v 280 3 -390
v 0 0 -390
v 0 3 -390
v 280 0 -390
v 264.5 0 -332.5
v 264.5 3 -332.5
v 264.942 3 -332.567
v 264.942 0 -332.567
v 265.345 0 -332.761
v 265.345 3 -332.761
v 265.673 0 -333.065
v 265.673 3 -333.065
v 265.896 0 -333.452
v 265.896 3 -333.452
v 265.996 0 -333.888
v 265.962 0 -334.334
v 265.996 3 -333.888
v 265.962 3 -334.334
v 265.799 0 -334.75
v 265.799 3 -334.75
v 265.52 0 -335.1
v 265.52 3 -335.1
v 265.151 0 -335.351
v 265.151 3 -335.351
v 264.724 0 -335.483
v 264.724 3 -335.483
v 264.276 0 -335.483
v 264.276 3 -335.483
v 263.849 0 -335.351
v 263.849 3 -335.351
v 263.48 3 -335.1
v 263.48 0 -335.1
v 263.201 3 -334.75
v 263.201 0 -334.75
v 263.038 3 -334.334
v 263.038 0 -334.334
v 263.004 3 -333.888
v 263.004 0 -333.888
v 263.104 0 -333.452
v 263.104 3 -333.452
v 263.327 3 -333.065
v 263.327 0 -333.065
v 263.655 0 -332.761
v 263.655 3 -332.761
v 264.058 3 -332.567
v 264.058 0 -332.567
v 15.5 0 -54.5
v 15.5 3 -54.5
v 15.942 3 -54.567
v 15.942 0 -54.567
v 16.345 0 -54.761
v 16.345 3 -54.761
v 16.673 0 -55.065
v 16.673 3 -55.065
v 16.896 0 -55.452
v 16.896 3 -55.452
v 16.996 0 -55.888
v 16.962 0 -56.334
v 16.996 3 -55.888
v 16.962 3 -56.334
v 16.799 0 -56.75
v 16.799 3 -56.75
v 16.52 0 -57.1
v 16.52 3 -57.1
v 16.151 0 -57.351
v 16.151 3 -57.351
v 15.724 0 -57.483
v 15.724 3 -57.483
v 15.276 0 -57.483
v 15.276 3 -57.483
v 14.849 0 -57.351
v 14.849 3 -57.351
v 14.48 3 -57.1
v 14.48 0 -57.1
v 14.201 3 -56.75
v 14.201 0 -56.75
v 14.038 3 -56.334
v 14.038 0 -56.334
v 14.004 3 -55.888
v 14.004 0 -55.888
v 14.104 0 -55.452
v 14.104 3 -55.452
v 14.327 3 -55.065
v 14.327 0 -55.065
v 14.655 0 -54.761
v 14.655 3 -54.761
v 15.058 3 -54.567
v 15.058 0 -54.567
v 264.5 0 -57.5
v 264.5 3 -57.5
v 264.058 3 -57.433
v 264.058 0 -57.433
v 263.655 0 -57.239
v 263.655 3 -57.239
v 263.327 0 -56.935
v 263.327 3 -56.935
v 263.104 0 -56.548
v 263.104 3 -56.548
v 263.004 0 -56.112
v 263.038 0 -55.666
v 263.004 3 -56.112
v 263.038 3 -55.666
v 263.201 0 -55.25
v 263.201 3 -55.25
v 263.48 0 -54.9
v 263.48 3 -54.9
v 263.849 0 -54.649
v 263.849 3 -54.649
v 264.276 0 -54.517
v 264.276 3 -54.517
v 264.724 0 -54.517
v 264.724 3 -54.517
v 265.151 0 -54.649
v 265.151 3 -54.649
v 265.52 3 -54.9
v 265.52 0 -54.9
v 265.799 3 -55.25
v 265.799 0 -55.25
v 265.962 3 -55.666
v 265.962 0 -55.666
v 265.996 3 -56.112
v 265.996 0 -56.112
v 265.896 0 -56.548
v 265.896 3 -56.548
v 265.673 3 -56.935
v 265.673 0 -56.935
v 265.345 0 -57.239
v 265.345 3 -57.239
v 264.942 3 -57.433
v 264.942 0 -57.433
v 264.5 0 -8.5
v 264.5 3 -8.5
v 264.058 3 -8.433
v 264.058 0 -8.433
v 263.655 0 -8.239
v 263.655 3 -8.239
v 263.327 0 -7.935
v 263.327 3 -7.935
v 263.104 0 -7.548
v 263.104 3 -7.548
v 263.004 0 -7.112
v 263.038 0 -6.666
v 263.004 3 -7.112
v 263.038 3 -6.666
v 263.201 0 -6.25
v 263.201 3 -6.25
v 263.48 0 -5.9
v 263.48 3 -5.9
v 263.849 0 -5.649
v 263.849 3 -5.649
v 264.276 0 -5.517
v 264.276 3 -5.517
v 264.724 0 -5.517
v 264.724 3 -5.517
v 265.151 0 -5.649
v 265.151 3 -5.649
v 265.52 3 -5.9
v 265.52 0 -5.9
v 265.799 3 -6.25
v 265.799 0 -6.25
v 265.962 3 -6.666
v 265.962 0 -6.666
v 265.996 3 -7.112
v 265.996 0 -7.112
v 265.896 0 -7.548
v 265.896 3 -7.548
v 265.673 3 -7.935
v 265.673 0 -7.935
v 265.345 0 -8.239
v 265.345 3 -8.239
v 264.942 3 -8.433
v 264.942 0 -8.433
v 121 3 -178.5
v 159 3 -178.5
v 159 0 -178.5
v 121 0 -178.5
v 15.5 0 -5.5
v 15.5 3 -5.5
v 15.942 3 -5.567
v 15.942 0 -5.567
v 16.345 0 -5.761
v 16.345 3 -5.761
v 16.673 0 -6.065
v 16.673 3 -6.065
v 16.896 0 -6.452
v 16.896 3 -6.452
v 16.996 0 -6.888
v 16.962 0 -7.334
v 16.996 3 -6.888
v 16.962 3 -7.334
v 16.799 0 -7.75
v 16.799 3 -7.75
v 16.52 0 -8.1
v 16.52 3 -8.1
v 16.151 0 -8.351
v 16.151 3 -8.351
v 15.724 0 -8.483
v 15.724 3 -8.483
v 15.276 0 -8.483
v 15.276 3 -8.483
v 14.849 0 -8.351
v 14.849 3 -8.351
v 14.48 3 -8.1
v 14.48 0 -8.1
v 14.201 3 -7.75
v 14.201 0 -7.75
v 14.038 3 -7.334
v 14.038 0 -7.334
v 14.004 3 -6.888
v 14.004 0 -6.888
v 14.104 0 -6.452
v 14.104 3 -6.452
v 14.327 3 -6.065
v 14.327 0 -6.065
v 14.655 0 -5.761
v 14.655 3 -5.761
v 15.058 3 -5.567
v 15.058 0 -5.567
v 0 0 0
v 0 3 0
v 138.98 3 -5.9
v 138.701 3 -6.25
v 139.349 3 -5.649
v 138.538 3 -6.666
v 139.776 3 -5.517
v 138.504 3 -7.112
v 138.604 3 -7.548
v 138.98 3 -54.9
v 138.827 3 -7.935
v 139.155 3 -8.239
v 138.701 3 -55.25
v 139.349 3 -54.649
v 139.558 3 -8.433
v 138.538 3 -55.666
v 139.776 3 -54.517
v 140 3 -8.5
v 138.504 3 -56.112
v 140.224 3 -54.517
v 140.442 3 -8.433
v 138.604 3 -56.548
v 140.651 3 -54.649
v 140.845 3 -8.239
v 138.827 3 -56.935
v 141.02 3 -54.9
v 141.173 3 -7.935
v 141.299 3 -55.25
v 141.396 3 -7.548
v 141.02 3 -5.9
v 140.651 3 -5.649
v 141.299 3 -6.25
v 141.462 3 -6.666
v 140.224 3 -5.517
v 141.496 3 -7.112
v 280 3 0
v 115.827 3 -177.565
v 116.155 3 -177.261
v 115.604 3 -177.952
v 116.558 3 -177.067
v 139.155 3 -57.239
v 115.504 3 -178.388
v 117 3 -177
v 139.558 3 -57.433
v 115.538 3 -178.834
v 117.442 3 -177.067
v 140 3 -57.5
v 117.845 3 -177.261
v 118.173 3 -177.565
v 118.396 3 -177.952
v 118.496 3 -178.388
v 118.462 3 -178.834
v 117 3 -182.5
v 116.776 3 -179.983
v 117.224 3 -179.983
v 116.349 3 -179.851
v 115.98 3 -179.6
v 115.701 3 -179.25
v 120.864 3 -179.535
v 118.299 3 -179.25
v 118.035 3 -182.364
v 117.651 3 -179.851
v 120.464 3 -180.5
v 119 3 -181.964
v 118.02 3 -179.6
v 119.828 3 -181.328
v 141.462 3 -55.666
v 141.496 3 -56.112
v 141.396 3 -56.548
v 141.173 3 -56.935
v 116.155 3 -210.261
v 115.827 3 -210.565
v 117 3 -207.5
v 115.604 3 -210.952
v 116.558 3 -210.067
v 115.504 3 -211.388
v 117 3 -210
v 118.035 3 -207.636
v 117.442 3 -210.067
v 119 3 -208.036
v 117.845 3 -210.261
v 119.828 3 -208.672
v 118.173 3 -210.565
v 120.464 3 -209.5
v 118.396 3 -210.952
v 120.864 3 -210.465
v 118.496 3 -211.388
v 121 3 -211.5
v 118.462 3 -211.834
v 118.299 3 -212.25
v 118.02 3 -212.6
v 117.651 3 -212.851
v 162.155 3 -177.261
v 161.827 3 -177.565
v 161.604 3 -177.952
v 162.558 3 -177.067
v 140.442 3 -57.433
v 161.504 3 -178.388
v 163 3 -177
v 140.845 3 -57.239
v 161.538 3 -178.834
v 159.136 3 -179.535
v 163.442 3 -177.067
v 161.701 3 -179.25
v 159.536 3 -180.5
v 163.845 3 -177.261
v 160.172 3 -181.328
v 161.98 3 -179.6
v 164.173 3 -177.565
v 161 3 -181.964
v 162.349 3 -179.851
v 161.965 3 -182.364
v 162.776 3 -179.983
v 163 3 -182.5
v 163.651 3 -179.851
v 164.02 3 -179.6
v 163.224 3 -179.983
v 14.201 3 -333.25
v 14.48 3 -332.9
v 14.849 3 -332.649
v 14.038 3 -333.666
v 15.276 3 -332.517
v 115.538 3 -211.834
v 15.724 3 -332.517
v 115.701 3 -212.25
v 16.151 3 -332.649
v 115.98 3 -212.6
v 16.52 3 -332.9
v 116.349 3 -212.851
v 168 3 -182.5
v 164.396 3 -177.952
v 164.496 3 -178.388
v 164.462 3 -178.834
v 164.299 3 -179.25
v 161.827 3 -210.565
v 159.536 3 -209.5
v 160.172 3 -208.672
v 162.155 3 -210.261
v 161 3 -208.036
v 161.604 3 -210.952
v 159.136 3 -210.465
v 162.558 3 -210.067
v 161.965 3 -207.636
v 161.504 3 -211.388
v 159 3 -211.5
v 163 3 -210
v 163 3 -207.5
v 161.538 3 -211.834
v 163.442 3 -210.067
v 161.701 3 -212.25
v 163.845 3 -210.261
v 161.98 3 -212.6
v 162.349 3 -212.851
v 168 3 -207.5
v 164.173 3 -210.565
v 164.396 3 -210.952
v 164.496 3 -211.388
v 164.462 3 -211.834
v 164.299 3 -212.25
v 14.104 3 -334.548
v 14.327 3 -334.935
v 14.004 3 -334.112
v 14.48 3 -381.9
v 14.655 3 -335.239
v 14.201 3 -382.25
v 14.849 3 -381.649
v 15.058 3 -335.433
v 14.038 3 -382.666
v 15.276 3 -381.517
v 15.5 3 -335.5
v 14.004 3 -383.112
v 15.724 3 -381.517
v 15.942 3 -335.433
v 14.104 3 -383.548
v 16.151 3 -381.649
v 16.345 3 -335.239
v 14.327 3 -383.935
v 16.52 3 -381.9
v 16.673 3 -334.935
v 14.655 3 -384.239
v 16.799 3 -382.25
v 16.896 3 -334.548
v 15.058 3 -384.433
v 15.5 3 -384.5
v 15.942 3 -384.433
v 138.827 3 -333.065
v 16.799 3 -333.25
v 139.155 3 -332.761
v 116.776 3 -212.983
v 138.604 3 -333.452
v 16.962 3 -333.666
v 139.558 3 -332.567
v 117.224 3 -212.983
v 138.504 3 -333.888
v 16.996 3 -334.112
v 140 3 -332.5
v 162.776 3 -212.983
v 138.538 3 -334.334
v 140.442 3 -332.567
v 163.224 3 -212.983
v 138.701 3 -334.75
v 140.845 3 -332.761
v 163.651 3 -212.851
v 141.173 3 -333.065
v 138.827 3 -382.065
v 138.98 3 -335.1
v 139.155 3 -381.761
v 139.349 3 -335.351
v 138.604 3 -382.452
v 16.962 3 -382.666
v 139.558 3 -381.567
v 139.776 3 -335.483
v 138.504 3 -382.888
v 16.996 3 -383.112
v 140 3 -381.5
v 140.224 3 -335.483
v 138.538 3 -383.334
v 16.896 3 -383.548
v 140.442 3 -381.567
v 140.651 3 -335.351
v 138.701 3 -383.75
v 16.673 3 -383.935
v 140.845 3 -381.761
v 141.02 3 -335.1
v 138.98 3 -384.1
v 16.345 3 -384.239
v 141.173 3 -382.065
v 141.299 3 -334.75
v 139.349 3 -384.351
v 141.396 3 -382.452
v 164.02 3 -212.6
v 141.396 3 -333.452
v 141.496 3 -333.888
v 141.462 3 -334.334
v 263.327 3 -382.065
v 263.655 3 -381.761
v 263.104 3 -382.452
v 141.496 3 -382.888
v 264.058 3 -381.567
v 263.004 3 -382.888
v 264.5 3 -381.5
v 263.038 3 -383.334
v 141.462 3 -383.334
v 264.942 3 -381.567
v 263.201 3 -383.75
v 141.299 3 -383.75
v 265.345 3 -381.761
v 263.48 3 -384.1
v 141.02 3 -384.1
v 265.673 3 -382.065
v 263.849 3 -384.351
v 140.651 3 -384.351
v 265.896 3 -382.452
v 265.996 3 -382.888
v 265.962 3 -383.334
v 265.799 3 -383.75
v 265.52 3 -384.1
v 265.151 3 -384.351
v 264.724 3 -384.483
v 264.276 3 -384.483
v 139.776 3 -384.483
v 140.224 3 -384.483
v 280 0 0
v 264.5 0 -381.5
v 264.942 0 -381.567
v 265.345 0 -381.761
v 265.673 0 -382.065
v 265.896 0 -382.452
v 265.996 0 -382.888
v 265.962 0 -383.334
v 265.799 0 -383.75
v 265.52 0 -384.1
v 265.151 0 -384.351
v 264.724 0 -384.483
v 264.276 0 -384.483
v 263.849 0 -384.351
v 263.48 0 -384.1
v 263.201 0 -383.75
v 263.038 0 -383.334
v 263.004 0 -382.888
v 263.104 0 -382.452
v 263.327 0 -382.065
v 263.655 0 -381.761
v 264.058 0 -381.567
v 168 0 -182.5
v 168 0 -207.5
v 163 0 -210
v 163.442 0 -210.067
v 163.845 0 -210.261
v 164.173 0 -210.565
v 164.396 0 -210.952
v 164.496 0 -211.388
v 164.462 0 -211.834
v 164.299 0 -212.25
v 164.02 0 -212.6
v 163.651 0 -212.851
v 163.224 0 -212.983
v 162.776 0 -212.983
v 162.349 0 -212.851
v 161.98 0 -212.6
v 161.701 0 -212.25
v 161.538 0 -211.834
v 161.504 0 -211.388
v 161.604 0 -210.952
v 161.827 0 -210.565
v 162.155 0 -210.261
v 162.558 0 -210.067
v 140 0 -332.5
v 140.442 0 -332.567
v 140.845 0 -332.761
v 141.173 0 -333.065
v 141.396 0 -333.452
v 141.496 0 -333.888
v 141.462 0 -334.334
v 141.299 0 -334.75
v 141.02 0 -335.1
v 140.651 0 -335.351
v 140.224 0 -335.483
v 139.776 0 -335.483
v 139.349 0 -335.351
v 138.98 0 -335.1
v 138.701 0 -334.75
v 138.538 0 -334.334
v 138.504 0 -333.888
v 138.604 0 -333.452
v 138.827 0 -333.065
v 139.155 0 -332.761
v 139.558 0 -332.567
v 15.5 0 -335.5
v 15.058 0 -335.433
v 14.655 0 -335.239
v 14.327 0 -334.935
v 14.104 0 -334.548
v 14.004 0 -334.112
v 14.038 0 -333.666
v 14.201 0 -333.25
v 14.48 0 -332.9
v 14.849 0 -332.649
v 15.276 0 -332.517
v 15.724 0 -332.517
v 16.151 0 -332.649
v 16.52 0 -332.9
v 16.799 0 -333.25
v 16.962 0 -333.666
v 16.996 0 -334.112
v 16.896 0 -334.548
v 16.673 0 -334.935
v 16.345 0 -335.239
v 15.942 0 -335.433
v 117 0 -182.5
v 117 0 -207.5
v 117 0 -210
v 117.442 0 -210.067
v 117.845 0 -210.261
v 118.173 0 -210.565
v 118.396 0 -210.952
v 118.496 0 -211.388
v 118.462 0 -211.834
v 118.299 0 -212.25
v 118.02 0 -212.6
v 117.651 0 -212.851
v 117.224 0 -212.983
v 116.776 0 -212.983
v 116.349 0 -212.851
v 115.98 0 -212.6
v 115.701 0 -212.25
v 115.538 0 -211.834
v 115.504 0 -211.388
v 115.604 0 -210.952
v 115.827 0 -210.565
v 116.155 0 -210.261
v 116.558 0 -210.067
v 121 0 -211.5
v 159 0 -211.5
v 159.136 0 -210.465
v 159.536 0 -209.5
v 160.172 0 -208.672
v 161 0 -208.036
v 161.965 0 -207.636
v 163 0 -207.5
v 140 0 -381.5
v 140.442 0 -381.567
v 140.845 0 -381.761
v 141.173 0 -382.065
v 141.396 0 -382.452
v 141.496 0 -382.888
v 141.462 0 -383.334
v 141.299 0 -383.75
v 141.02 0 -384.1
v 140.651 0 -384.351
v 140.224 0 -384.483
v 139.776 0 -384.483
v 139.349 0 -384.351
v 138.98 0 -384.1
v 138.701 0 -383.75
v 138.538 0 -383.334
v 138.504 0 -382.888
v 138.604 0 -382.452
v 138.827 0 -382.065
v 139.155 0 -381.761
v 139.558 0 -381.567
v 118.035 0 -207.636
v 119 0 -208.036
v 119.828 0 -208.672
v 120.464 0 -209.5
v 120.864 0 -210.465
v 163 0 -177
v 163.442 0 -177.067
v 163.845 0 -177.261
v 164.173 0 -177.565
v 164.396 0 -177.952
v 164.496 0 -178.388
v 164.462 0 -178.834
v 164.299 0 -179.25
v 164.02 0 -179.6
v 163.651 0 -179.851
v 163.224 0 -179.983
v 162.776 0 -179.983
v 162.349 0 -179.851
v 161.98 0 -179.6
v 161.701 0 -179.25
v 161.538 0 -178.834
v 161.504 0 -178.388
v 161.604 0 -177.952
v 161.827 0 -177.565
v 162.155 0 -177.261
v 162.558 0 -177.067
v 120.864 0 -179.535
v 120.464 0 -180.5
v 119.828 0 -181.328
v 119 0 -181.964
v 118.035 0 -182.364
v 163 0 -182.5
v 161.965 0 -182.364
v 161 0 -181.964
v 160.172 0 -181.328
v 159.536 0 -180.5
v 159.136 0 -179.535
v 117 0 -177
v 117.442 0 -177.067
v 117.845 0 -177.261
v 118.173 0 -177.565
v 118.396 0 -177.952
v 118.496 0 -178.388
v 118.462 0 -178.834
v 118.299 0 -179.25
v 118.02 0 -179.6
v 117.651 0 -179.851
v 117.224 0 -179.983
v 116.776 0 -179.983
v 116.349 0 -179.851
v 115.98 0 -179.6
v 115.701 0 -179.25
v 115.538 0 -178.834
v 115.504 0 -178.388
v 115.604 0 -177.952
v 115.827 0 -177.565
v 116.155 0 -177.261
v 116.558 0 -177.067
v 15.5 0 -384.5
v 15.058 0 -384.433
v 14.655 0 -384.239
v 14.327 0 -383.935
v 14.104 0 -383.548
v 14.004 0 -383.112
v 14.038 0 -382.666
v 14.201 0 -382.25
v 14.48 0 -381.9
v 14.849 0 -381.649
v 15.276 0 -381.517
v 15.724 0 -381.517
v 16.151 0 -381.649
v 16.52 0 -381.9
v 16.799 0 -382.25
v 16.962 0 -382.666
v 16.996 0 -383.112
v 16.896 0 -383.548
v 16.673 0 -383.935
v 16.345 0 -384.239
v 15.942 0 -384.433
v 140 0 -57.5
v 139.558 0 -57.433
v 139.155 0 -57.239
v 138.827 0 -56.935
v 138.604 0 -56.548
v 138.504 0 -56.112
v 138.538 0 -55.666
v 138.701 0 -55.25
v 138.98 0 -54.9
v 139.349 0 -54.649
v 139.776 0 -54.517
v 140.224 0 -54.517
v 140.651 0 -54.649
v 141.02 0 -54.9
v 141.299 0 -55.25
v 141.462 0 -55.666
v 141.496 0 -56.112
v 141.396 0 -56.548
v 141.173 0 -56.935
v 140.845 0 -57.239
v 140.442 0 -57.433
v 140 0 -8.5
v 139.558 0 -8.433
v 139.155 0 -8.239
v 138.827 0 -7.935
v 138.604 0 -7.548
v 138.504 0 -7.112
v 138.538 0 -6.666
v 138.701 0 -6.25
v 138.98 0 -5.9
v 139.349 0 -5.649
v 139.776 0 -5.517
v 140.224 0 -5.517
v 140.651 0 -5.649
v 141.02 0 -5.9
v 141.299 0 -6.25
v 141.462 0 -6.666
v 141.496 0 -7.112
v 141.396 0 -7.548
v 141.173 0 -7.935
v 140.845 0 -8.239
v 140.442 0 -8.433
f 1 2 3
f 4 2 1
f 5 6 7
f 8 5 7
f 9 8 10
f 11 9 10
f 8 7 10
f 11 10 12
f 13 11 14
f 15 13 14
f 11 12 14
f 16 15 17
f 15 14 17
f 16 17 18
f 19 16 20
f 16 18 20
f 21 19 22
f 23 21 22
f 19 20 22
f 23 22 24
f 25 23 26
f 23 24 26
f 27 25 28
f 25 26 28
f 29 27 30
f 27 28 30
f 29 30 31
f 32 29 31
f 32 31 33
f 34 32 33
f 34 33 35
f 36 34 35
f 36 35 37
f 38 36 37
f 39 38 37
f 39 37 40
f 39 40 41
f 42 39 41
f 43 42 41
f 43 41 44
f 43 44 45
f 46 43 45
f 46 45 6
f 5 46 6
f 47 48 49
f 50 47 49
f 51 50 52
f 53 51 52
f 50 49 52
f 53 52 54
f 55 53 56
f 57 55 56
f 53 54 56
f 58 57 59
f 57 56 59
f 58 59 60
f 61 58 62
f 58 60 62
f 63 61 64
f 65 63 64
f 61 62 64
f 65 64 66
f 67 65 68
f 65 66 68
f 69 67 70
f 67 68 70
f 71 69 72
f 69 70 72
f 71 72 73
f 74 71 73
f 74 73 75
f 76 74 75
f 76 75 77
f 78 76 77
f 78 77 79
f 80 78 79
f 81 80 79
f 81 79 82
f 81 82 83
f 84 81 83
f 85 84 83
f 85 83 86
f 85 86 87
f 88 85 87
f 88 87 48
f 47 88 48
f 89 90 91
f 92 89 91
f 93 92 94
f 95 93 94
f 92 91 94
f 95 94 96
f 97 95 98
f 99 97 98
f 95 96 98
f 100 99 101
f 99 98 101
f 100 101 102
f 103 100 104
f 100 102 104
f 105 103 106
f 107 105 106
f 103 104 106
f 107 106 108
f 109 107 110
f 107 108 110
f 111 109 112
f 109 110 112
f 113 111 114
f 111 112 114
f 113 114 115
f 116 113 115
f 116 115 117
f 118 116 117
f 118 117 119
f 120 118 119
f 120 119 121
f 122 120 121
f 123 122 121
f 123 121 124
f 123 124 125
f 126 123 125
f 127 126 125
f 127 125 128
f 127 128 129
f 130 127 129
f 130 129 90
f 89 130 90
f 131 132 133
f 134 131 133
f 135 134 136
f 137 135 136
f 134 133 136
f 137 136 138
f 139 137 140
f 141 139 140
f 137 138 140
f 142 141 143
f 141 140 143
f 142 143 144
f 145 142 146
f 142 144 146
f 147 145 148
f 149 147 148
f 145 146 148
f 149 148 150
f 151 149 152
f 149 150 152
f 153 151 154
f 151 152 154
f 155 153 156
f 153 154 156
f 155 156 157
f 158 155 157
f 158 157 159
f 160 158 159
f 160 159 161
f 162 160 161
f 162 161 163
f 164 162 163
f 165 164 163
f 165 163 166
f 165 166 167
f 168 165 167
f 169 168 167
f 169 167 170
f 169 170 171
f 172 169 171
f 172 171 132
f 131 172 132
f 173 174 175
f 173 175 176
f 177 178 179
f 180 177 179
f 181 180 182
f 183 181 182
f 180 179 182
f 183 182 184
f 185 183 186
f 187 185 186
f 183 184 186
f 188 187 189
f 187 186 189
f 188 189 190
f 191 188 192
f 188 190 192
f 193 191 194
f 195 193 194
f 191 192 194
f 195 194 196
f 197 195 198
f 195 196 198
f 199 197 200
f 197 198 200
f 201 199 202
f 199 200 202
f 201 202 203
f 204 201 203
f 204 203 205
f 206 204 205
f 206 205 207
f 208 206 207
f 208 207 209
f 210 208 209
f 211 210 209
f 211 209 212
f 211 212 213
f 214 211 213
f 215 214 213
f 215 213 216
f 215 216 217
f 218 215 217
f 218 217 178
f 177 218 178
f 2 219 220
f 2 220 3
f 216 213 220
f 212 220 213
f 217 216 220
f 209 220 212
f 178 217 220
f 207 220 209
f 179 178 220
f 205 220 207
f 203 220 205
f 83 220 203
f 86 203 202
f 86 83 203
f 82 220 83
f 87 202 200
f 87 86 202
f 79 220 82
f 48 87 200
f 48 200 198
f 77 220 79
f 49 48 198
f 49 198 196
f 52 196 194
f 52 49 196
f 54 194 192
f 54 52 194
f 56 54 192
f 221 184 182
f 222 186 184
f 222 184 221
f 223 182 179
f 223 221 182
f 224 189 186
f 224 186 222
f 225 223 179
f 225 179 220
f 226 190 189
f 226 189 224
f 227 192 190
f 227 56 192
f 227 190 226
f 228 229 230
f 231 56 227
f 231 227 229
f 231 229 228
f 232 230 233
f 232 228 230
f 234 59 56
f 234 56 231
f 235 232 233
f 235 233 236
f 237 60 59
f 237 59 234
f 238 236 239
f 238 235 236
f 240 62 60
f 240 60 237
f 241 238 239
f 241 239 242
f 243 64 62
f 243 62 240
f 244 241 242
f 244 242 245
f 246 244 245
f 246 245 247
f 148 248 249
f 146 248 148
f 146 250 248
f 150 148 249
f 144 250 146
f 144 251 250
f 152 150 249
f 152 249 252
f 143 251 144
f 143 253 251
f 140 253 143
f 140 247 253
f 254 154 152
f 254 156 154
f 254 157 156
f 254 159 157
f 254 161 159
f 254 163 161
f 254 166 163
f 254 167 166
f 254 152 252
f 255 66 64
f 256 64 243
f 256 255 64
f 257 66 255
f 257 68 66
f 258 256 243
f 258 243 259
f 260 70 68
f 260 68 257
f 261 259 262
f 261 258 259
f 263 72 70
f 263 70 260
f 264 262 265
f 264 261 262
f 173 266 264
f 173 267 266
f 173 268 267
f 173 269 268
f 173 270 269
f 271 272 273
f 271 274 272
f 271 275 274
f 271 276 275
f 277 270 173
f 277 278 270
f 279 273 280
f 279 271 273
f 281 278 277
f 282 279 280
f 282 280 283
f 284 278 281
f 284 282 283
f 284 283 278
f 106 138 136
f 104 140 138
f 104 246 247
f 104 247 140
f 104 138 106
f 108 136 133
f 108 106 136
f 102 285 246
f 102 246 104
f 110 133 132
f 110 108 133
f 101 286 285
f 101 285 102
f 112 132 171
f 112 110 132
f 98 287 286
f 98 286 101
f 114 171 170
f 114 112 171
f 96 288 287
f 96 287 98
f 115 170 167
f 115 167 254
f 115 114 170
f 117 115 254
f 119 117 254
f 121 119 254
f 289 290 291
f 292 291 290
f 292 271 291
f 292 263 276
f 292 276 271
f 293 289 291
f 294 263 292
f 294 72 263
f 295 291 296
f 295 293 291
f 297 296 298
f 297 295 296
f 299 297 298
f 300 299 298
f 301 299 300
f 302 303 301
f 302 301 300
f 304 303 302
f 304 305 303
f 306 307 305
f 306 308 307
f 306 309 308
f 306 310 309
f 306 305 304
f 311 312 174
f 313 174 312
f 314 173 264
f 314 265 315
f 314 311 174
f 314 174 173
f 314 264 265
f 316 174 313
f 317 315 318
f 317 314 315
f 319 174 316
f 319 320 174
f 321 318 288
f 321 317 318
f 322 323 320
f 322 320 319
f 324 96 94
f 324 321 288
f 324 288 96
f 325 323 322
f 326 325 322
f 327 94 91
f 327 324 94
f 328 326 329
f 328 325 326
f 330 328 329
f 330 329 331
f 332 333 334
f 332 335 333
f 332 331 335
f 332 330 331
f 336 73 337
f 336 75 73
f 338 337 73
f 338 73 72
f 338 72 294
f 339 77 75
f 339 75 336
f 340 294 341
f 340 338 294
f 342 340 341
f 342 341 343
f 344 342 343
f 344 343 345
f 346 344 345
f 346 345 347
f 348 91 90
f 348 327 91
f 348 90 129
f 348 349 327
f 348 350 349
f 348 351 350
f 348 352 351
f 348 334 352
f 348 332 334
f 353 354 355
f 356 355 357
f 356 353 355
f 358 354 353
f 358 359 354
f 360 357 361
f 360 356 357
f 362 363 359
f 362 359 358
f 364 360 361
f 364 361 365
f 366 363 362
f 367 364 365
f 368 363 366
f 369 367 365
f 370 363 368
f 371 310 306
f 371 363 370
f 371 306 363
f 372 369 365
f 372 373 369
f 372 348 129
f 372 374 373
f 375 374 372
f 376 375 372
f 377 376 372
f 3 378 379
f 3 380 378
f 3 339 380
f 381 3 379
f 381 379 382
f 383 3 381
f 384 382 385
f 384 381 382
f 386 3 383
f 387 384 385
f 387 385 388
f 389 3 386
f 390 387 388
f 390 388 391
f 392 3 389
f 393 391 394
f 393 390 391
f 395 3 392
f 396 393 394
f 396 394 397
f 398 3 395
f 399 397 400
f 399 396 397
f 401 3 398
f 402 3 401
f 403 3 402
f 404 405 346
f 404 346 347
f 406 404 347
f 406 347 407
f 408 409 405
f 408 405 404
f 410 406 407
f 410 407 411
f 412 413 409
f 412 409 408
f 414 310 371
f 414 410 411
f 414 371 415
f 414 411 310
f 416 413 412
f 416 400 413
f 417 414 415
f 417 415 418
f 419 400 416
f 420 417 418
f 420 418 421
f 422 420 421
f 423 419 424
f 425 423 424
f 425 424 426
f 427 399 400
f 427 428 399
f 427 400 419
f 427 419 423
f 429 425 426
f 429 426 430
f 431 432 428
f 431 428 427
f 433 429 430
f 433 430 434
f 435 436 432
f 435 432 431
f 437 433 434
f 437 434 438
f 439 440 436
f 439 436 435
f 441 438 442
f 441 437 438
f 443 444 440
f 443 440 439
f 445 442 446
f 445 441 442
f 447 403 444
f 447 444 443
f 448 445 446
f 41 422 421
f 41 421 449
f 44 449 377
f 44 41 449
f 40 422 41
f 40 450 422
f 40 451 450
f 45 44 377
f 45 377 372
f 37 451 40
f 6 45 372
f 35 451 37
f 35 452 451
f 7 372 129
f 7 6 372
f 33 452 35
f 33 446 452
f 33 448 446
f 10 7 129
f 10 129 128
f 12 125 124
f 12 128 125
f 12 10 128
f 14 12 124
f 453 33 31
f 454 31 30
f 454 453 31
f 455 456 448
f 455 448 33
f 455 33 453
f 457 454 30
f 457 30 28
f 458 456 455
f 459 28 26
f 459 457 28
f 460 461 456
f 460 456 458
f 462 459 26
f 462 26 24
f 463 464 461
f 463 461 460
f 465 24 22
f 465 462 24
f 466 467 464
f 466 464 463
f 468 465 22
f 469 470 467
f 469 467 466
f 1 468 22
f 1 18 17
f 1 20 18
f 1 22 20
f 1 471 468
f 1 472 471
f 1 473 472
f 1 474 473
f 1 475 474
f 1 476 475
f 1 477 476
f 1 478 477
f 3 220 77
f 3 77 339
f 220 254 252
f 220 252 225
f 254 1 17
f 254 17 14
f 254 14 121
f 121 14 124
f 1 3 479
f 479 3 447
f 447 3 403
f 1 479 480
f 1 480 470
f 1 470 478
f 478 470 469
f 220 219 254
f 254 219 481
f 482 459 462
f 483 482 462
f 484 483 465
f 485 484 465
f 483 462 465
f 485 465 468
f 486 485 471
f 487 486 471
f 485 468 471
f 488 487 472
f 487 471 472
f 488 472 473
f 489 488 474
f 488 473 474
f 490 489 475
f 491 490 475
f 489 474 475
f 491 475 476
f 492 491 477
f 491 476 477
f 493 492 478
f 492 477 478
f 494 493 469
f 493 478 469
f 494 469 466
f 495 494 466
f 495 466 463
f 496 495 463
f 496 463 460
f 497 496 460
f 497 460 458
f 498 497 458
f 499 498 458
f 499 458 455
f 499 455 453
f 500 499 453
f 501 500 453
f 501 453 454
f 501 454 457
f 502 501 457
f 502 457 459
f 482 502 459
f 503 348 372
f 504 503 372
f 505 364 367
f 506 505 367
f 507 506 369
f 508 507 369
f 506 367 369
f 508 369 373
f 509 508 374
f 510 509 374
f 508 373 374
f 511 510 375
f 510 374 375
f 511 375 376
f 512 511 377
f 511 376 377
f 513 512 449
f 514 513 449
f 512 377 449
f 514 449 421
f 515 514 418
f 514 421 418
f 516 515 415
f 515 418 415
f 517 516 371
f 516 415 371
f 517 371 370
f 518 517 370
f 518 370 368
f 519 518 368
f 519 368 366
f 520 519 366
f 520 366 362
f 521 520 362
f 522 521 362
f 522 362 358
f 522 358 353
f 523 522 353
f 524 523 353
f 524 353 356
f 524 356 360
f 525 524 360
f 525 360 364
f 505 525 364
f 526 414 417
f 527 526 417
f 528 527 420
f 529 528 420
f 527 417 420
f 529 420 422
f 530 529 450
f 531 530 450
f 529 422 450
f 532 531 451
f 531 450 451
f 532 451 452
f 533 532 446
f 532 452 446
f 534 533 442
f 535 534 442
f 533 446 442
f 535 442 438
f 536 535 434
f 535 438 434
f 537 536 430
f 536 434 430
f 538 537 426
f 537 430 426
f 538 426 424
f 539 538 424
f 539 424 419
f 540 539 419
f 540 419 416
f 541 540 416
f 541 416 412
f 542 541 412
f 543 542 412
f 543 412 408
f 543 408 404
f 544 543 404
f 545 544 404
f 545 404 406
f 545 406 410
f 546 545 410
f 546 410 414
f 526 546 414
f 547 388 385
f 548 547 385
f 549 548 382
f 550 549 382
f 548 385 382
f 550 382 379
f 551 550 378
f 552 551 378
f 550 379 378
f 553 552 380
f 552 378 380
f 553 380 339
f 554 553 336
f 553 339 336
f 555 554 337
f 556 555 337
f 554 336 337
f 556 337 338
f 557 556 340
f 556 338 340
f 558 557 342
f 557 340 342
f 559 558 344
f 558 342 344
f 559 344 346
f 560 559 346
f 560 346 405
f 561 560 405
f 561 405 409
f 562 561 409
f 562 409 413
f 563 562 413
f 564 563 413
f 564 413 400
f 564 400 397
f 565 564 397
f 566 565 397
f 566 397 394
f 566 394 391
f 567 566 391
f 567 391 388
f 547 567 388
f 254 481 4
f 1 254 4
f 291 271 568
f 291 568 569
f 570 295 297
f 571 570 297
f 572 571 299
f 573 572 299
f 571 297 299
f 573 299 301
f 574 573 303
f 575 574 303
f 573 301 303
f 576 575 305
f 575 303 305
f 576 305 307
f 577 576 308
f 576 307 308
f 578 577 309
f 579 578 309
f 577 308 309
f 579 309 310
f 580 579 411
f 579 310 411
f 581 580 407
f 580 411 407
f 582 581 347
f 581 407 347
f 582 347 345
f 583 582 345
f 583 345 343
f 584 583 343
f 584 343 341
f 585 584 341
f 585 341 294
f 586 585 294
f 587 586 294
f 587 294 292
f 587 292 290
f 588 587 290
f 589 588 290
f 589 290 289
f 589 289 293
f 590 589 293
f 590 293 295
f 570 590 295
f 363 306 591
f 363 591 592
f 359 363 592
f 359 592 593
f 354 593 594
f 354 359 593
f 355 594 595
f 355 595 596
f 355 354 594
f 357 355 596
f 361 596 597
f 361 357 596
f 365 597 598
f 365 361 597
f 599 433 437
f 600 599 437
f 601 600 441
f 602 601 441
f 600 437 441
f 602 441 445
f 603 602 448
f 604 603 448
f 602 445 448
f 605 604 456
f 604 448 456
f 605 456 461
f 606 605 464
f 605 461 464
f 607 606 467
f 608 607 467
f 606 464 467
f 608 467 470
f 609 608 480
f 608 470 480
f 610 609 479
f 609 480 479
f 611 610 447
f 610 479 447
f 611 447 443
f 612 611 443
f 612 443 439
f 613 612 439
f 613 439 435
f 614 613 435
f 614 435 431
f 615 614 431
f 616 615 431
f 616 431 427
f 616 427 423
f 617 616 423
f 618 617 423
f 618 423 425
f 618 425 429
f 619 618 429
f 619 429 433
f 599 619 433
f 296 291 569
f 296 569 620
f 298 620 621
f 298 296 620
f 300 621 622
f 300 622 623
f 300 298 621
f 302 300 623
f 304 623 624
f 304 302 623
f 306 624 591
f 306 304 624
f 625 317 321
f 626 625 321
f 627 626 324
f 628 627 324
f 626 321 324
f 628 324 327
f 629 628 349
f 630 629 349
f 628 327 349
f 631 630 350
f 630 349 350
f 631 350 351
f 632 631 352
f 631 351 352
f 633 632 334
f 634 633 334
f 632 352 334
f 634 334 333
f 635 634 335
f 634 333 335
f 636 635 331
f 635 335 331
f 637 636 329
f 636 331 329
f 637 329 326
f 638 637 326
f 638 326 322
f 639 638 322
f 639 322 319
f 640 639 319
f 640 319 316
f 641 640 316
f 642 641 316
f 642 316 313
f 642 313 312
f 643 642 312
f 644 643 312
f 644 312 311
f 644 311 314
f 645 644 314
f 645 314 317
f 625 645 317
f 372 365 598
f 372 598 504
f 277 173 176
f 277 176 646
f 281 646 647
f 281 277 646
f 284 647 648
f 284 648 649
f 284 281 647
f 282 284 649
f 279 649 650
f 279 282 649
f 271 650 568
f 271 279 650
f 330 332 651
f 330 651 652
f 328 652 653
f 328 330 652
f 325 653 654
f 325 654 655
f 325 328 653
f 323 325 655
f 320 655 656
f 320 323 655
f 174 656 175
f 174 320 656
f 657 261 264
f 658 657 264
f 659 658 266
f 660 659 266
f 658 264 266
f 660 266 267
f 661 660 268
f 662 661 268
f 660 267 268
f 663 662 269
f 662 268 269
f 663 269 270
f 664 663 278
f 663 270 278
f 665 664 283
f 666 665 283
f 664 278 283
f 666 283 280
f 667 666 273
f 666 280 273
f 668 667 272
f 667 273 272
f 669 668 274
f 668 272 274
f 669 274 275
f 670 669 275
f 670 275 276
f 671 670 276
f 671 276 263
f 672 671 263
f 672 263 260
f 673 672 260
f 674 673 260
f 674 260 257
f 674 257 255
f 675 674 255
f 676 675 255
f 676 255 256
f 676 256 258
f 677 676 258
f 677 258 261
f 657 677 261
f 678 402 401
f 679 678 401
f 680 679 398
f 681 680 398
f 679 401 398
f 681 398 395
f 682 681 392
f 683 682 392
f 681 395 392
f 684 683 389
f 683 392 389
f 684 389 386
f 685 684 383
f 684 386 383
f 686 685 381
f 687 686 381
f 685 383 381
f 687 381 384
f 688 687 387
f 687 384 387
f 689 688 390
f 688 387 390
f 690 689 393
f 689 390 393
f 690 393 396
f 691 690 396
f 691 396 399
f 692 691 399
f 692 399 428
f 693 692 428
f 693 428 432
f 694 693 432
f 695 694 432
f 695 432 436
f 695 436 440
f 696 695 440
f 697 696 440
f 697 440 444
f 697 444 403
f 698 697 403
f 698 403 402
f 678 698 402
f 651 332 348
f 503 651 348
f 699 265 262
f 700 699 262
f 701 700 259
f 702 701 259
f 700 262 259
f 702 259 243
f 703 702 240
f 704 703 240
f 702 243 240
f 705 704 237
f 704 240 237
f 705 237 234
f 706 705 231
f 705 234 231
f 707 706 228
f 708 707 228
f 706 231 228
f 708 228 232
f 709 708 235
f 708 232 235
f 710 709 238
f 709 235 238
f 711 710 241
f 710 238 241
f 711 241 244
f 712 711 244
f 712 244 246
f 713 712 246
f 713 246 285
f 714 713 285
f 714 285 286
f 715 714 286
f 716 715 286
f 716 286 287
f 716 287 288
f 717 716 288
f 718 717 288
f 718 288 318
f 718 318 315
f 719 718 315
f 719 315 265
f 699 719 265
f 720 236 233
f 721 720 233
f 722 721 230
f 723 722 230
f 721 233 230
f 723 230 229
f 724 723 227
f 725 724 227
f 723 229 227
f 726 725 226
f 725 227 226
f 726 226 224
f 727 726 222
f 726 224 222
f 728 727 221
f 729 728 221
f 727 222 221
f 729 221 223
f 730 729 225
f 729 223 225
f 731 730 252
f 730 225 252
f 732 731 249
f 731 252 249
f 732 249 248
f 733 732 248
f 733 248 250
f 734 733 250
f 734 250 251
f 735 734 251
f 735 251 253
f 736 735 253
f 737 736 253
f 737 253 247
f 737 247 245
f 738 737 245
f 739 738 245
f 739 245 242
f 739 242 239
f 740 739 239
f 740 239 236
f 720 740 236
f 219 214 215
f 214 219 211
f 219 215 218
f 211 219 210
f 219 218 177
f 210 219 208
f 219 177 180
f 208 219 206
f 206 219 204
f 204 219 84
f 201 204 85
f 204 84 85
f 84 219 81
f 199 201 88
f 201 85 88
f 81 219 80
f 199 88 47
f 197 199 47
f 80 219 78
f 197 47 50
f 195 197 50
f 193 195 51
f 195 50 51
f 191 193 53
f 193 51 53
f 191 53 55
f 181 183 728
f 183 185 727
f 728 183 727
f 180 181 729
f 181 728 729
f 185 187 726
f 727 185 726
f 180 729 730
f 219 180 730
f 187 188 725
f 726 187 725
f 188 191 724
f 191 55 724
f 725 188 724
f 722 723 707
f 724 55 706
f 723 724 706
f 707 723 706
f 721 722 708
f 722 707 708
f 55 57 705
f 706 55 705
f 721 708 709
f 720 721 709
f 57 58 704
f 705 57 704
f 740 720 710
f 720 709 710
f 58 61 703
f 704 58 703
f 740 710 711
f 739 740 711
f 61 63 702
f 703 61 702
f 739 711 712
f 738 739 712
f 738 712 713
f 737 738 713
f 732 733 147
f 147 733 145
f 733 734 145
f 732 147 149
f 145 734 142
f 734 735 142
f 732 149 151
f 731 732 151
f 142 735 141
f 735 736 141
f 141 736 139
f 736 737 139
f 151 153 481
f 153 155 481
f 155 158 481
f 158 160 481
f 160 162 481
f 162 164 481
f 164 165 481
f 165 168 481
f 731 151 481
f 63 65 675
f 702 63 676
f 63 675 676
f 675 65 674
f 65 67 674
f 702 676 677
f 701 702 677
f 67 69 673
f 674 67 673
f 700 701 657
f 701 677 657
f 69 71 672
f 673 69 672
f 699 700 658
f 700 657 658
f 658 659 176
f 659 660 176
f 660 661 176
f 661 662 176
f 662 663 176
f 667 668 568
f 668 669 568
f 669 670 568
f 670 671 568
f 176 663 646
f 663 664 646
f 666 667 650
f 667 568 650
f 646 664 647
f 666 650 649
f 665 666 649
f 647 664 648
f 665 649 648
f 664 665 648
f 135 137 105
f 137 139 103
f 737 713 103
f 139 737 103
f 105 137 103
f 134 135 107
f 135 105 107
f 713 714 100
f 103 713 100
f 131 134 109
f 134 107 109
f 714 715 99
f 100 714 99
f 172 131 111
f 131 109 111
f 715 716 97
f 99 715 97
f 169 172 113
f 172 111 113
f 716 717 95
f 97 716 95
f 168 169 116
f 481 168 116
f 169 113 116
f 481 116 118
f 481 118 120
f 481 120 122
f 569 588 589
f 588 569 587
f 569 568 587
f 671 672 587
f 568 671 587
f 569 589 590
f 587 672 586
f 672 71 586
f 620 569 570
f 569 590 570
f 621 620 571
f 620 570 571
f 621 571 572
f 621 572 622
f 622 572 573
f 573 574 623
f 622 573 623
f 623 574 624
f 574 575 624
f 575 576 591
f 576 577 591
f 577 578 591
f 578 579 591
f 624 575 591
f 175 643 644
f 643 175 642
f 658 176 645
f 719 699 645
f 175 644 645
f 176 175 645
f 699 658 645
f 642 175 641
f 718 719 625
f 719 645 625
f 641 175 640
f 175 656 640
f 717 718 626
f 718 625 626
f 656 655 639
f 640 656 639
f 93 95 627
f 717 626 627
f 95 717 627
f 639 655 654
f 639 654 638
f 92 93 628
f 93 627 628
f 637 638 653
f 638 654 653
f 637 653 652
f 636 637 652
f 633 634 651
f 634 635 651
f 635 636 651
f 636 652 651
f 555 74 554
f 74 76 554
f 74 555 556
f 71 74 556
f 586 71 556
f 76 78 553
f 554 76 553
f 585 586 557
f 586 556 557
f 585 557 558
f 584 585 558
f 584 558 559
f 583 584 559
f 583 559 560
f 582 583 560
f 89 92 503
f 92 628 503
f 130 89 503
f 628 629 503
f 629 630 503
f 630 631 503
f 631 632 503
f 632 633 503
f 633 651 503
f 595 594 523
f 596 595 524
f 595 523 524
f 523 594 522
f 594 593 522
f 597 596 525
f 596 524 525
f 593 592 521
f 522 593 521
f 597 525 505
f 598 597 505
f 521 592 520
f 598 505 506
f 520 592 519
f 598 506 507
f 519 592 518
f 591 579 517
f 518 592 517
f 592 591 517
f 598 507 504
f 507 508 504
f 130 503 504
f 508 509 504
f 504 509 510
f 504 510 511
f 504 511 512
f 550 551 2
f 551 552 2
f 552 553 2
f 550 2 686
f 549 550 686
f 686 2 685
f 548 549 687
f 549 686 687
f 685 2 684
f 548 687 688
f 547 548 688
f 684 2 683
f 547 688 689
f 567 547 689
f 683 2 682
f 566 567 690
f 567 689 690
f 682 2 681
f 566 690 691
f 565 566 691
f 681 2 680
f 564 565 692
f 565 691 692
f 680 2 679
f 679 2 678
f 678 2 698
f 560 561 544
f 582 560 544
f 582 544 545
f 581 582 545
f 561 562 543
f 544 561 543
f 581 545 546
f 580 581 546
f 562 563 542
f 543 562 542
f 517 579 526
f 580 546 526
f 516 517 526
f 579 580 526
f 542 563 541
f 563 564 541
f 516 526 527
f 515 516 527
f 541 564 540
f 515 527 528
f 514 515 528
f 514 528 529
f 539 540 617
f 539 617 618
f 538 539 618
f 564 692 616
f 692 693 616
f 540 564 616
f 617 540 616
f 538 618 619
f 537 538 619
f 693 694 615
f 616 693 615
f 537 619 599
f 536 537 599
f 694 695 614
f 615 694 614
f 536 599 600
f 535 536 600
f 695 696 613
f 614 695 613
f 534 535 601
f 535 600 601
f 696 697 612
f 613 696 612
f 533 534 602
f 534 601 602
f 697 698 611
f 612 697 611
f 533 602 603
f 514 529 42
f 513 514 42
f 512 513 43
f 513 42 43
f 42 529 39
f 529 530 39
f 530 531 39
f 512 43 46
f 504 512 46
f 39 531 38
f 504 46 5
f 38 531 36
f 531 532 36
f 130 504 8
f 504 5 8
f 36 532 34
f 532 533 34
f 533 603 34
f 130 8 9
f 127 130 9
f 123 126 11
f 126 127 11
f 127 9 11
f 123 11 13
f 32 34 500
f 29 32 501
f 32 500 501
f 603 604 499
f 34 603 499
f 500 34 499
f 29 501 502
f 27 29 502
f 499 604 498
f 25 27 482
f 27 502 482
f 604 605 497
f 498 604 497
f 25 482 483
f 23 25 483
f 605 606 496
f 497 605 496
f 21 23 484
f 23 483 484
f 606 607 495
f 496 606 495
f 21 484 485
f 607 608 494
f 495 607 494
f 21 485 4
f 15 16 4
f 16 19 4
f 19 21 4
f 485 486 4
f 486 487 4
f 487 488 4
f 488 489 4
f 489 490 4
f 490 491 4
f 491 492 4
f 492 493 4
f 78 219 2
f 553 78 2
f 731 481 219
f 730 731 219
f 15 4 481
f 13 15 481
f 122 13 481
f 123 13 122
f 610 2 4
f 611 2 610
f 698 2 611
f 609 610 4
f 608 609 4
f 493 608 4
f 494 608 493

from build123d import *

# Parameters (mm, degrees)
SKETCH_1_W          = 280
SKETCH_1_H          = 390
EXTRUDE_1_DEPTH     = 3
SKETCH_2_R          = 1.5
CUT_EXTRUDE_1_DEPTH = 481.113528241
SKETCH_3_R          = 1.5
CUT_EXTRUDE_2_DEPTH = 481.113528241
CUT_EXTRUDE_5_DEPTH = 481.113528241
SKETCH_7_W          = 5
SKETCH_7_H          = 25
CUT_EXTRUDE_6_DEPTH = 481.113528241


with BuildPart() as part:
    # 草图1 → 凸台-拉伸1 (new body)
    with BuildSketch(Plane(origin=(0, 0, 0), x_dir=(1, 0, 0), z_dir=(0, 1, 0))):
        with Locations((140, 195)):
            Rectangle(SKETCH_1_W, SKETCH_1_H)
    extrude(amount=EXTRUDE_1_DEPTH)

    # 草图2 → 切除-拉伸1 (cut, through all)
    with BuildSketch(Plane(origin=(0, 3, 0), x_dir=(1, 0, 0), z_dir=(0, 1, 0))):
        with Locations(Location((140, 383, 0), (0, 0, 270))):
            Circle(SKETCH_2_R)
        with Locations(Location((140, 334, 0), (0, 0, 270))):
            Circle(SKETCH_2_R)
        with Locations(Location((264.5, 383, 0), (0, 0, 270))):
            Circle(SKETCH_2_R)
        with Locations(Location((264.5, 334, 0), (0, 0, 270))):
            Circle(SKETCH_2_R)
        with Locations(Location((15.5, 383, 0), (0, 0, 90))):
            Circle(SKETCH_2_R)
        with Locations(Location((15.5, 334, 0), (0, 0, 90))):
            Circle(SKETCH_2_R)
        with Locations(Location((264.5, 56, 0), (0, 0, 90))):
            Circle(SKETCH_2_R)
        with Locations(Location((264.5, 7, 0), (0, 0, 90))):
            Circle(SKETCH_2_R)
        with Locations(Location((140, 7, 0), (0, 0, 90))):
            Circle(SKETCH_2_R)
        with Locations(Location((140, 56, 0), (0, 0, 90))):
            Circle(SKETCH_2_R)
        with Locations(Location((15.5, 56, 0), (0, 0, 270))):
            Circle(SKETCH_2_R)
        with Locations(Location((15.5, 7, 0), (0, 0, 270))):
            Circle(SKETCH_2_R)
    extrude(amount=-CUT_EXTRUDE_1_DEPTH, mode=Mode.SUBTRACT)

    # 草图3 → 切除-拉伸2 (cut, through all)
    with BuildSketch(Plane(origin=(0, 3, 0), x_dir=(1, 0, 0), z_dir=(0, 1, 0))):
        with Locations(Location((117, 211.5, 0), (0, 0, 270))):
            Circle(SKETCH_3_R)
        with Locations(Location((163, 211.5, 0), (0, 0, 270))):
            Circle(SKETCH_3_R)
        with Locations(Location((163, 178.5, 0), (0, 0, 270))):
            Circle(SKETCH_3_R)
        with Locations(Location((117, 178.5, 0), (0, 0, 270))):
            Circle(SKETCH_3_R)
    extrude(amount=-CUT_EXTRUDE_2_DEPTH, mode=Mode.SUBTRACT)

    # 草图6 → 切除-拉伸5 (cut, through all)
    with BuildSketch(Plane(origin=(0, 3, 0), x_dir=(1, 0, 0), z_dir=(0, 1, 0))):
        with BuildLine():
            Line((121, 211.5), (159, 211.5))
            ThreePointArc((159, 211.5), (160.171572875, 208.671572875), (163, 207.5))
            Line((163, 207.5), (163, 182.5))
            ThreePointArc((163, 182.5), (160.171572875, 181.328427125), (159, 178.5))
            Line((159, 178.5), (121, 178.5))
            ThreePointArc((121, 178.5), (119.828427125, 181.328427125), (117, 182.5))
            Line((117, 182.5), (117, 207.5))
            ThreePointArc((117, 207.5), (119.828427125, 208.671572875), (121, 211.5))
        make_face()
    extrude(amount=-CUT_EXTRUDE_5_DEPTH, mode=Mode.SUBTRACT)

    # 草图7 → 切除-拉伸6 (cut, through all)
    with BuildSketch(Plane(origin=(0, 3, 0), x_dir=(1, 0, 0), z_dir=(0, 1, 0))):
        with Locations((165.5, 195)):
            Rectangle(SKETCH_7_W, SKETCH_7_H)
    extrude(amount=-CUT_EXTRUDE_6_DEPTH, mode=Mode.SUBTRACT)


solid = part.part
